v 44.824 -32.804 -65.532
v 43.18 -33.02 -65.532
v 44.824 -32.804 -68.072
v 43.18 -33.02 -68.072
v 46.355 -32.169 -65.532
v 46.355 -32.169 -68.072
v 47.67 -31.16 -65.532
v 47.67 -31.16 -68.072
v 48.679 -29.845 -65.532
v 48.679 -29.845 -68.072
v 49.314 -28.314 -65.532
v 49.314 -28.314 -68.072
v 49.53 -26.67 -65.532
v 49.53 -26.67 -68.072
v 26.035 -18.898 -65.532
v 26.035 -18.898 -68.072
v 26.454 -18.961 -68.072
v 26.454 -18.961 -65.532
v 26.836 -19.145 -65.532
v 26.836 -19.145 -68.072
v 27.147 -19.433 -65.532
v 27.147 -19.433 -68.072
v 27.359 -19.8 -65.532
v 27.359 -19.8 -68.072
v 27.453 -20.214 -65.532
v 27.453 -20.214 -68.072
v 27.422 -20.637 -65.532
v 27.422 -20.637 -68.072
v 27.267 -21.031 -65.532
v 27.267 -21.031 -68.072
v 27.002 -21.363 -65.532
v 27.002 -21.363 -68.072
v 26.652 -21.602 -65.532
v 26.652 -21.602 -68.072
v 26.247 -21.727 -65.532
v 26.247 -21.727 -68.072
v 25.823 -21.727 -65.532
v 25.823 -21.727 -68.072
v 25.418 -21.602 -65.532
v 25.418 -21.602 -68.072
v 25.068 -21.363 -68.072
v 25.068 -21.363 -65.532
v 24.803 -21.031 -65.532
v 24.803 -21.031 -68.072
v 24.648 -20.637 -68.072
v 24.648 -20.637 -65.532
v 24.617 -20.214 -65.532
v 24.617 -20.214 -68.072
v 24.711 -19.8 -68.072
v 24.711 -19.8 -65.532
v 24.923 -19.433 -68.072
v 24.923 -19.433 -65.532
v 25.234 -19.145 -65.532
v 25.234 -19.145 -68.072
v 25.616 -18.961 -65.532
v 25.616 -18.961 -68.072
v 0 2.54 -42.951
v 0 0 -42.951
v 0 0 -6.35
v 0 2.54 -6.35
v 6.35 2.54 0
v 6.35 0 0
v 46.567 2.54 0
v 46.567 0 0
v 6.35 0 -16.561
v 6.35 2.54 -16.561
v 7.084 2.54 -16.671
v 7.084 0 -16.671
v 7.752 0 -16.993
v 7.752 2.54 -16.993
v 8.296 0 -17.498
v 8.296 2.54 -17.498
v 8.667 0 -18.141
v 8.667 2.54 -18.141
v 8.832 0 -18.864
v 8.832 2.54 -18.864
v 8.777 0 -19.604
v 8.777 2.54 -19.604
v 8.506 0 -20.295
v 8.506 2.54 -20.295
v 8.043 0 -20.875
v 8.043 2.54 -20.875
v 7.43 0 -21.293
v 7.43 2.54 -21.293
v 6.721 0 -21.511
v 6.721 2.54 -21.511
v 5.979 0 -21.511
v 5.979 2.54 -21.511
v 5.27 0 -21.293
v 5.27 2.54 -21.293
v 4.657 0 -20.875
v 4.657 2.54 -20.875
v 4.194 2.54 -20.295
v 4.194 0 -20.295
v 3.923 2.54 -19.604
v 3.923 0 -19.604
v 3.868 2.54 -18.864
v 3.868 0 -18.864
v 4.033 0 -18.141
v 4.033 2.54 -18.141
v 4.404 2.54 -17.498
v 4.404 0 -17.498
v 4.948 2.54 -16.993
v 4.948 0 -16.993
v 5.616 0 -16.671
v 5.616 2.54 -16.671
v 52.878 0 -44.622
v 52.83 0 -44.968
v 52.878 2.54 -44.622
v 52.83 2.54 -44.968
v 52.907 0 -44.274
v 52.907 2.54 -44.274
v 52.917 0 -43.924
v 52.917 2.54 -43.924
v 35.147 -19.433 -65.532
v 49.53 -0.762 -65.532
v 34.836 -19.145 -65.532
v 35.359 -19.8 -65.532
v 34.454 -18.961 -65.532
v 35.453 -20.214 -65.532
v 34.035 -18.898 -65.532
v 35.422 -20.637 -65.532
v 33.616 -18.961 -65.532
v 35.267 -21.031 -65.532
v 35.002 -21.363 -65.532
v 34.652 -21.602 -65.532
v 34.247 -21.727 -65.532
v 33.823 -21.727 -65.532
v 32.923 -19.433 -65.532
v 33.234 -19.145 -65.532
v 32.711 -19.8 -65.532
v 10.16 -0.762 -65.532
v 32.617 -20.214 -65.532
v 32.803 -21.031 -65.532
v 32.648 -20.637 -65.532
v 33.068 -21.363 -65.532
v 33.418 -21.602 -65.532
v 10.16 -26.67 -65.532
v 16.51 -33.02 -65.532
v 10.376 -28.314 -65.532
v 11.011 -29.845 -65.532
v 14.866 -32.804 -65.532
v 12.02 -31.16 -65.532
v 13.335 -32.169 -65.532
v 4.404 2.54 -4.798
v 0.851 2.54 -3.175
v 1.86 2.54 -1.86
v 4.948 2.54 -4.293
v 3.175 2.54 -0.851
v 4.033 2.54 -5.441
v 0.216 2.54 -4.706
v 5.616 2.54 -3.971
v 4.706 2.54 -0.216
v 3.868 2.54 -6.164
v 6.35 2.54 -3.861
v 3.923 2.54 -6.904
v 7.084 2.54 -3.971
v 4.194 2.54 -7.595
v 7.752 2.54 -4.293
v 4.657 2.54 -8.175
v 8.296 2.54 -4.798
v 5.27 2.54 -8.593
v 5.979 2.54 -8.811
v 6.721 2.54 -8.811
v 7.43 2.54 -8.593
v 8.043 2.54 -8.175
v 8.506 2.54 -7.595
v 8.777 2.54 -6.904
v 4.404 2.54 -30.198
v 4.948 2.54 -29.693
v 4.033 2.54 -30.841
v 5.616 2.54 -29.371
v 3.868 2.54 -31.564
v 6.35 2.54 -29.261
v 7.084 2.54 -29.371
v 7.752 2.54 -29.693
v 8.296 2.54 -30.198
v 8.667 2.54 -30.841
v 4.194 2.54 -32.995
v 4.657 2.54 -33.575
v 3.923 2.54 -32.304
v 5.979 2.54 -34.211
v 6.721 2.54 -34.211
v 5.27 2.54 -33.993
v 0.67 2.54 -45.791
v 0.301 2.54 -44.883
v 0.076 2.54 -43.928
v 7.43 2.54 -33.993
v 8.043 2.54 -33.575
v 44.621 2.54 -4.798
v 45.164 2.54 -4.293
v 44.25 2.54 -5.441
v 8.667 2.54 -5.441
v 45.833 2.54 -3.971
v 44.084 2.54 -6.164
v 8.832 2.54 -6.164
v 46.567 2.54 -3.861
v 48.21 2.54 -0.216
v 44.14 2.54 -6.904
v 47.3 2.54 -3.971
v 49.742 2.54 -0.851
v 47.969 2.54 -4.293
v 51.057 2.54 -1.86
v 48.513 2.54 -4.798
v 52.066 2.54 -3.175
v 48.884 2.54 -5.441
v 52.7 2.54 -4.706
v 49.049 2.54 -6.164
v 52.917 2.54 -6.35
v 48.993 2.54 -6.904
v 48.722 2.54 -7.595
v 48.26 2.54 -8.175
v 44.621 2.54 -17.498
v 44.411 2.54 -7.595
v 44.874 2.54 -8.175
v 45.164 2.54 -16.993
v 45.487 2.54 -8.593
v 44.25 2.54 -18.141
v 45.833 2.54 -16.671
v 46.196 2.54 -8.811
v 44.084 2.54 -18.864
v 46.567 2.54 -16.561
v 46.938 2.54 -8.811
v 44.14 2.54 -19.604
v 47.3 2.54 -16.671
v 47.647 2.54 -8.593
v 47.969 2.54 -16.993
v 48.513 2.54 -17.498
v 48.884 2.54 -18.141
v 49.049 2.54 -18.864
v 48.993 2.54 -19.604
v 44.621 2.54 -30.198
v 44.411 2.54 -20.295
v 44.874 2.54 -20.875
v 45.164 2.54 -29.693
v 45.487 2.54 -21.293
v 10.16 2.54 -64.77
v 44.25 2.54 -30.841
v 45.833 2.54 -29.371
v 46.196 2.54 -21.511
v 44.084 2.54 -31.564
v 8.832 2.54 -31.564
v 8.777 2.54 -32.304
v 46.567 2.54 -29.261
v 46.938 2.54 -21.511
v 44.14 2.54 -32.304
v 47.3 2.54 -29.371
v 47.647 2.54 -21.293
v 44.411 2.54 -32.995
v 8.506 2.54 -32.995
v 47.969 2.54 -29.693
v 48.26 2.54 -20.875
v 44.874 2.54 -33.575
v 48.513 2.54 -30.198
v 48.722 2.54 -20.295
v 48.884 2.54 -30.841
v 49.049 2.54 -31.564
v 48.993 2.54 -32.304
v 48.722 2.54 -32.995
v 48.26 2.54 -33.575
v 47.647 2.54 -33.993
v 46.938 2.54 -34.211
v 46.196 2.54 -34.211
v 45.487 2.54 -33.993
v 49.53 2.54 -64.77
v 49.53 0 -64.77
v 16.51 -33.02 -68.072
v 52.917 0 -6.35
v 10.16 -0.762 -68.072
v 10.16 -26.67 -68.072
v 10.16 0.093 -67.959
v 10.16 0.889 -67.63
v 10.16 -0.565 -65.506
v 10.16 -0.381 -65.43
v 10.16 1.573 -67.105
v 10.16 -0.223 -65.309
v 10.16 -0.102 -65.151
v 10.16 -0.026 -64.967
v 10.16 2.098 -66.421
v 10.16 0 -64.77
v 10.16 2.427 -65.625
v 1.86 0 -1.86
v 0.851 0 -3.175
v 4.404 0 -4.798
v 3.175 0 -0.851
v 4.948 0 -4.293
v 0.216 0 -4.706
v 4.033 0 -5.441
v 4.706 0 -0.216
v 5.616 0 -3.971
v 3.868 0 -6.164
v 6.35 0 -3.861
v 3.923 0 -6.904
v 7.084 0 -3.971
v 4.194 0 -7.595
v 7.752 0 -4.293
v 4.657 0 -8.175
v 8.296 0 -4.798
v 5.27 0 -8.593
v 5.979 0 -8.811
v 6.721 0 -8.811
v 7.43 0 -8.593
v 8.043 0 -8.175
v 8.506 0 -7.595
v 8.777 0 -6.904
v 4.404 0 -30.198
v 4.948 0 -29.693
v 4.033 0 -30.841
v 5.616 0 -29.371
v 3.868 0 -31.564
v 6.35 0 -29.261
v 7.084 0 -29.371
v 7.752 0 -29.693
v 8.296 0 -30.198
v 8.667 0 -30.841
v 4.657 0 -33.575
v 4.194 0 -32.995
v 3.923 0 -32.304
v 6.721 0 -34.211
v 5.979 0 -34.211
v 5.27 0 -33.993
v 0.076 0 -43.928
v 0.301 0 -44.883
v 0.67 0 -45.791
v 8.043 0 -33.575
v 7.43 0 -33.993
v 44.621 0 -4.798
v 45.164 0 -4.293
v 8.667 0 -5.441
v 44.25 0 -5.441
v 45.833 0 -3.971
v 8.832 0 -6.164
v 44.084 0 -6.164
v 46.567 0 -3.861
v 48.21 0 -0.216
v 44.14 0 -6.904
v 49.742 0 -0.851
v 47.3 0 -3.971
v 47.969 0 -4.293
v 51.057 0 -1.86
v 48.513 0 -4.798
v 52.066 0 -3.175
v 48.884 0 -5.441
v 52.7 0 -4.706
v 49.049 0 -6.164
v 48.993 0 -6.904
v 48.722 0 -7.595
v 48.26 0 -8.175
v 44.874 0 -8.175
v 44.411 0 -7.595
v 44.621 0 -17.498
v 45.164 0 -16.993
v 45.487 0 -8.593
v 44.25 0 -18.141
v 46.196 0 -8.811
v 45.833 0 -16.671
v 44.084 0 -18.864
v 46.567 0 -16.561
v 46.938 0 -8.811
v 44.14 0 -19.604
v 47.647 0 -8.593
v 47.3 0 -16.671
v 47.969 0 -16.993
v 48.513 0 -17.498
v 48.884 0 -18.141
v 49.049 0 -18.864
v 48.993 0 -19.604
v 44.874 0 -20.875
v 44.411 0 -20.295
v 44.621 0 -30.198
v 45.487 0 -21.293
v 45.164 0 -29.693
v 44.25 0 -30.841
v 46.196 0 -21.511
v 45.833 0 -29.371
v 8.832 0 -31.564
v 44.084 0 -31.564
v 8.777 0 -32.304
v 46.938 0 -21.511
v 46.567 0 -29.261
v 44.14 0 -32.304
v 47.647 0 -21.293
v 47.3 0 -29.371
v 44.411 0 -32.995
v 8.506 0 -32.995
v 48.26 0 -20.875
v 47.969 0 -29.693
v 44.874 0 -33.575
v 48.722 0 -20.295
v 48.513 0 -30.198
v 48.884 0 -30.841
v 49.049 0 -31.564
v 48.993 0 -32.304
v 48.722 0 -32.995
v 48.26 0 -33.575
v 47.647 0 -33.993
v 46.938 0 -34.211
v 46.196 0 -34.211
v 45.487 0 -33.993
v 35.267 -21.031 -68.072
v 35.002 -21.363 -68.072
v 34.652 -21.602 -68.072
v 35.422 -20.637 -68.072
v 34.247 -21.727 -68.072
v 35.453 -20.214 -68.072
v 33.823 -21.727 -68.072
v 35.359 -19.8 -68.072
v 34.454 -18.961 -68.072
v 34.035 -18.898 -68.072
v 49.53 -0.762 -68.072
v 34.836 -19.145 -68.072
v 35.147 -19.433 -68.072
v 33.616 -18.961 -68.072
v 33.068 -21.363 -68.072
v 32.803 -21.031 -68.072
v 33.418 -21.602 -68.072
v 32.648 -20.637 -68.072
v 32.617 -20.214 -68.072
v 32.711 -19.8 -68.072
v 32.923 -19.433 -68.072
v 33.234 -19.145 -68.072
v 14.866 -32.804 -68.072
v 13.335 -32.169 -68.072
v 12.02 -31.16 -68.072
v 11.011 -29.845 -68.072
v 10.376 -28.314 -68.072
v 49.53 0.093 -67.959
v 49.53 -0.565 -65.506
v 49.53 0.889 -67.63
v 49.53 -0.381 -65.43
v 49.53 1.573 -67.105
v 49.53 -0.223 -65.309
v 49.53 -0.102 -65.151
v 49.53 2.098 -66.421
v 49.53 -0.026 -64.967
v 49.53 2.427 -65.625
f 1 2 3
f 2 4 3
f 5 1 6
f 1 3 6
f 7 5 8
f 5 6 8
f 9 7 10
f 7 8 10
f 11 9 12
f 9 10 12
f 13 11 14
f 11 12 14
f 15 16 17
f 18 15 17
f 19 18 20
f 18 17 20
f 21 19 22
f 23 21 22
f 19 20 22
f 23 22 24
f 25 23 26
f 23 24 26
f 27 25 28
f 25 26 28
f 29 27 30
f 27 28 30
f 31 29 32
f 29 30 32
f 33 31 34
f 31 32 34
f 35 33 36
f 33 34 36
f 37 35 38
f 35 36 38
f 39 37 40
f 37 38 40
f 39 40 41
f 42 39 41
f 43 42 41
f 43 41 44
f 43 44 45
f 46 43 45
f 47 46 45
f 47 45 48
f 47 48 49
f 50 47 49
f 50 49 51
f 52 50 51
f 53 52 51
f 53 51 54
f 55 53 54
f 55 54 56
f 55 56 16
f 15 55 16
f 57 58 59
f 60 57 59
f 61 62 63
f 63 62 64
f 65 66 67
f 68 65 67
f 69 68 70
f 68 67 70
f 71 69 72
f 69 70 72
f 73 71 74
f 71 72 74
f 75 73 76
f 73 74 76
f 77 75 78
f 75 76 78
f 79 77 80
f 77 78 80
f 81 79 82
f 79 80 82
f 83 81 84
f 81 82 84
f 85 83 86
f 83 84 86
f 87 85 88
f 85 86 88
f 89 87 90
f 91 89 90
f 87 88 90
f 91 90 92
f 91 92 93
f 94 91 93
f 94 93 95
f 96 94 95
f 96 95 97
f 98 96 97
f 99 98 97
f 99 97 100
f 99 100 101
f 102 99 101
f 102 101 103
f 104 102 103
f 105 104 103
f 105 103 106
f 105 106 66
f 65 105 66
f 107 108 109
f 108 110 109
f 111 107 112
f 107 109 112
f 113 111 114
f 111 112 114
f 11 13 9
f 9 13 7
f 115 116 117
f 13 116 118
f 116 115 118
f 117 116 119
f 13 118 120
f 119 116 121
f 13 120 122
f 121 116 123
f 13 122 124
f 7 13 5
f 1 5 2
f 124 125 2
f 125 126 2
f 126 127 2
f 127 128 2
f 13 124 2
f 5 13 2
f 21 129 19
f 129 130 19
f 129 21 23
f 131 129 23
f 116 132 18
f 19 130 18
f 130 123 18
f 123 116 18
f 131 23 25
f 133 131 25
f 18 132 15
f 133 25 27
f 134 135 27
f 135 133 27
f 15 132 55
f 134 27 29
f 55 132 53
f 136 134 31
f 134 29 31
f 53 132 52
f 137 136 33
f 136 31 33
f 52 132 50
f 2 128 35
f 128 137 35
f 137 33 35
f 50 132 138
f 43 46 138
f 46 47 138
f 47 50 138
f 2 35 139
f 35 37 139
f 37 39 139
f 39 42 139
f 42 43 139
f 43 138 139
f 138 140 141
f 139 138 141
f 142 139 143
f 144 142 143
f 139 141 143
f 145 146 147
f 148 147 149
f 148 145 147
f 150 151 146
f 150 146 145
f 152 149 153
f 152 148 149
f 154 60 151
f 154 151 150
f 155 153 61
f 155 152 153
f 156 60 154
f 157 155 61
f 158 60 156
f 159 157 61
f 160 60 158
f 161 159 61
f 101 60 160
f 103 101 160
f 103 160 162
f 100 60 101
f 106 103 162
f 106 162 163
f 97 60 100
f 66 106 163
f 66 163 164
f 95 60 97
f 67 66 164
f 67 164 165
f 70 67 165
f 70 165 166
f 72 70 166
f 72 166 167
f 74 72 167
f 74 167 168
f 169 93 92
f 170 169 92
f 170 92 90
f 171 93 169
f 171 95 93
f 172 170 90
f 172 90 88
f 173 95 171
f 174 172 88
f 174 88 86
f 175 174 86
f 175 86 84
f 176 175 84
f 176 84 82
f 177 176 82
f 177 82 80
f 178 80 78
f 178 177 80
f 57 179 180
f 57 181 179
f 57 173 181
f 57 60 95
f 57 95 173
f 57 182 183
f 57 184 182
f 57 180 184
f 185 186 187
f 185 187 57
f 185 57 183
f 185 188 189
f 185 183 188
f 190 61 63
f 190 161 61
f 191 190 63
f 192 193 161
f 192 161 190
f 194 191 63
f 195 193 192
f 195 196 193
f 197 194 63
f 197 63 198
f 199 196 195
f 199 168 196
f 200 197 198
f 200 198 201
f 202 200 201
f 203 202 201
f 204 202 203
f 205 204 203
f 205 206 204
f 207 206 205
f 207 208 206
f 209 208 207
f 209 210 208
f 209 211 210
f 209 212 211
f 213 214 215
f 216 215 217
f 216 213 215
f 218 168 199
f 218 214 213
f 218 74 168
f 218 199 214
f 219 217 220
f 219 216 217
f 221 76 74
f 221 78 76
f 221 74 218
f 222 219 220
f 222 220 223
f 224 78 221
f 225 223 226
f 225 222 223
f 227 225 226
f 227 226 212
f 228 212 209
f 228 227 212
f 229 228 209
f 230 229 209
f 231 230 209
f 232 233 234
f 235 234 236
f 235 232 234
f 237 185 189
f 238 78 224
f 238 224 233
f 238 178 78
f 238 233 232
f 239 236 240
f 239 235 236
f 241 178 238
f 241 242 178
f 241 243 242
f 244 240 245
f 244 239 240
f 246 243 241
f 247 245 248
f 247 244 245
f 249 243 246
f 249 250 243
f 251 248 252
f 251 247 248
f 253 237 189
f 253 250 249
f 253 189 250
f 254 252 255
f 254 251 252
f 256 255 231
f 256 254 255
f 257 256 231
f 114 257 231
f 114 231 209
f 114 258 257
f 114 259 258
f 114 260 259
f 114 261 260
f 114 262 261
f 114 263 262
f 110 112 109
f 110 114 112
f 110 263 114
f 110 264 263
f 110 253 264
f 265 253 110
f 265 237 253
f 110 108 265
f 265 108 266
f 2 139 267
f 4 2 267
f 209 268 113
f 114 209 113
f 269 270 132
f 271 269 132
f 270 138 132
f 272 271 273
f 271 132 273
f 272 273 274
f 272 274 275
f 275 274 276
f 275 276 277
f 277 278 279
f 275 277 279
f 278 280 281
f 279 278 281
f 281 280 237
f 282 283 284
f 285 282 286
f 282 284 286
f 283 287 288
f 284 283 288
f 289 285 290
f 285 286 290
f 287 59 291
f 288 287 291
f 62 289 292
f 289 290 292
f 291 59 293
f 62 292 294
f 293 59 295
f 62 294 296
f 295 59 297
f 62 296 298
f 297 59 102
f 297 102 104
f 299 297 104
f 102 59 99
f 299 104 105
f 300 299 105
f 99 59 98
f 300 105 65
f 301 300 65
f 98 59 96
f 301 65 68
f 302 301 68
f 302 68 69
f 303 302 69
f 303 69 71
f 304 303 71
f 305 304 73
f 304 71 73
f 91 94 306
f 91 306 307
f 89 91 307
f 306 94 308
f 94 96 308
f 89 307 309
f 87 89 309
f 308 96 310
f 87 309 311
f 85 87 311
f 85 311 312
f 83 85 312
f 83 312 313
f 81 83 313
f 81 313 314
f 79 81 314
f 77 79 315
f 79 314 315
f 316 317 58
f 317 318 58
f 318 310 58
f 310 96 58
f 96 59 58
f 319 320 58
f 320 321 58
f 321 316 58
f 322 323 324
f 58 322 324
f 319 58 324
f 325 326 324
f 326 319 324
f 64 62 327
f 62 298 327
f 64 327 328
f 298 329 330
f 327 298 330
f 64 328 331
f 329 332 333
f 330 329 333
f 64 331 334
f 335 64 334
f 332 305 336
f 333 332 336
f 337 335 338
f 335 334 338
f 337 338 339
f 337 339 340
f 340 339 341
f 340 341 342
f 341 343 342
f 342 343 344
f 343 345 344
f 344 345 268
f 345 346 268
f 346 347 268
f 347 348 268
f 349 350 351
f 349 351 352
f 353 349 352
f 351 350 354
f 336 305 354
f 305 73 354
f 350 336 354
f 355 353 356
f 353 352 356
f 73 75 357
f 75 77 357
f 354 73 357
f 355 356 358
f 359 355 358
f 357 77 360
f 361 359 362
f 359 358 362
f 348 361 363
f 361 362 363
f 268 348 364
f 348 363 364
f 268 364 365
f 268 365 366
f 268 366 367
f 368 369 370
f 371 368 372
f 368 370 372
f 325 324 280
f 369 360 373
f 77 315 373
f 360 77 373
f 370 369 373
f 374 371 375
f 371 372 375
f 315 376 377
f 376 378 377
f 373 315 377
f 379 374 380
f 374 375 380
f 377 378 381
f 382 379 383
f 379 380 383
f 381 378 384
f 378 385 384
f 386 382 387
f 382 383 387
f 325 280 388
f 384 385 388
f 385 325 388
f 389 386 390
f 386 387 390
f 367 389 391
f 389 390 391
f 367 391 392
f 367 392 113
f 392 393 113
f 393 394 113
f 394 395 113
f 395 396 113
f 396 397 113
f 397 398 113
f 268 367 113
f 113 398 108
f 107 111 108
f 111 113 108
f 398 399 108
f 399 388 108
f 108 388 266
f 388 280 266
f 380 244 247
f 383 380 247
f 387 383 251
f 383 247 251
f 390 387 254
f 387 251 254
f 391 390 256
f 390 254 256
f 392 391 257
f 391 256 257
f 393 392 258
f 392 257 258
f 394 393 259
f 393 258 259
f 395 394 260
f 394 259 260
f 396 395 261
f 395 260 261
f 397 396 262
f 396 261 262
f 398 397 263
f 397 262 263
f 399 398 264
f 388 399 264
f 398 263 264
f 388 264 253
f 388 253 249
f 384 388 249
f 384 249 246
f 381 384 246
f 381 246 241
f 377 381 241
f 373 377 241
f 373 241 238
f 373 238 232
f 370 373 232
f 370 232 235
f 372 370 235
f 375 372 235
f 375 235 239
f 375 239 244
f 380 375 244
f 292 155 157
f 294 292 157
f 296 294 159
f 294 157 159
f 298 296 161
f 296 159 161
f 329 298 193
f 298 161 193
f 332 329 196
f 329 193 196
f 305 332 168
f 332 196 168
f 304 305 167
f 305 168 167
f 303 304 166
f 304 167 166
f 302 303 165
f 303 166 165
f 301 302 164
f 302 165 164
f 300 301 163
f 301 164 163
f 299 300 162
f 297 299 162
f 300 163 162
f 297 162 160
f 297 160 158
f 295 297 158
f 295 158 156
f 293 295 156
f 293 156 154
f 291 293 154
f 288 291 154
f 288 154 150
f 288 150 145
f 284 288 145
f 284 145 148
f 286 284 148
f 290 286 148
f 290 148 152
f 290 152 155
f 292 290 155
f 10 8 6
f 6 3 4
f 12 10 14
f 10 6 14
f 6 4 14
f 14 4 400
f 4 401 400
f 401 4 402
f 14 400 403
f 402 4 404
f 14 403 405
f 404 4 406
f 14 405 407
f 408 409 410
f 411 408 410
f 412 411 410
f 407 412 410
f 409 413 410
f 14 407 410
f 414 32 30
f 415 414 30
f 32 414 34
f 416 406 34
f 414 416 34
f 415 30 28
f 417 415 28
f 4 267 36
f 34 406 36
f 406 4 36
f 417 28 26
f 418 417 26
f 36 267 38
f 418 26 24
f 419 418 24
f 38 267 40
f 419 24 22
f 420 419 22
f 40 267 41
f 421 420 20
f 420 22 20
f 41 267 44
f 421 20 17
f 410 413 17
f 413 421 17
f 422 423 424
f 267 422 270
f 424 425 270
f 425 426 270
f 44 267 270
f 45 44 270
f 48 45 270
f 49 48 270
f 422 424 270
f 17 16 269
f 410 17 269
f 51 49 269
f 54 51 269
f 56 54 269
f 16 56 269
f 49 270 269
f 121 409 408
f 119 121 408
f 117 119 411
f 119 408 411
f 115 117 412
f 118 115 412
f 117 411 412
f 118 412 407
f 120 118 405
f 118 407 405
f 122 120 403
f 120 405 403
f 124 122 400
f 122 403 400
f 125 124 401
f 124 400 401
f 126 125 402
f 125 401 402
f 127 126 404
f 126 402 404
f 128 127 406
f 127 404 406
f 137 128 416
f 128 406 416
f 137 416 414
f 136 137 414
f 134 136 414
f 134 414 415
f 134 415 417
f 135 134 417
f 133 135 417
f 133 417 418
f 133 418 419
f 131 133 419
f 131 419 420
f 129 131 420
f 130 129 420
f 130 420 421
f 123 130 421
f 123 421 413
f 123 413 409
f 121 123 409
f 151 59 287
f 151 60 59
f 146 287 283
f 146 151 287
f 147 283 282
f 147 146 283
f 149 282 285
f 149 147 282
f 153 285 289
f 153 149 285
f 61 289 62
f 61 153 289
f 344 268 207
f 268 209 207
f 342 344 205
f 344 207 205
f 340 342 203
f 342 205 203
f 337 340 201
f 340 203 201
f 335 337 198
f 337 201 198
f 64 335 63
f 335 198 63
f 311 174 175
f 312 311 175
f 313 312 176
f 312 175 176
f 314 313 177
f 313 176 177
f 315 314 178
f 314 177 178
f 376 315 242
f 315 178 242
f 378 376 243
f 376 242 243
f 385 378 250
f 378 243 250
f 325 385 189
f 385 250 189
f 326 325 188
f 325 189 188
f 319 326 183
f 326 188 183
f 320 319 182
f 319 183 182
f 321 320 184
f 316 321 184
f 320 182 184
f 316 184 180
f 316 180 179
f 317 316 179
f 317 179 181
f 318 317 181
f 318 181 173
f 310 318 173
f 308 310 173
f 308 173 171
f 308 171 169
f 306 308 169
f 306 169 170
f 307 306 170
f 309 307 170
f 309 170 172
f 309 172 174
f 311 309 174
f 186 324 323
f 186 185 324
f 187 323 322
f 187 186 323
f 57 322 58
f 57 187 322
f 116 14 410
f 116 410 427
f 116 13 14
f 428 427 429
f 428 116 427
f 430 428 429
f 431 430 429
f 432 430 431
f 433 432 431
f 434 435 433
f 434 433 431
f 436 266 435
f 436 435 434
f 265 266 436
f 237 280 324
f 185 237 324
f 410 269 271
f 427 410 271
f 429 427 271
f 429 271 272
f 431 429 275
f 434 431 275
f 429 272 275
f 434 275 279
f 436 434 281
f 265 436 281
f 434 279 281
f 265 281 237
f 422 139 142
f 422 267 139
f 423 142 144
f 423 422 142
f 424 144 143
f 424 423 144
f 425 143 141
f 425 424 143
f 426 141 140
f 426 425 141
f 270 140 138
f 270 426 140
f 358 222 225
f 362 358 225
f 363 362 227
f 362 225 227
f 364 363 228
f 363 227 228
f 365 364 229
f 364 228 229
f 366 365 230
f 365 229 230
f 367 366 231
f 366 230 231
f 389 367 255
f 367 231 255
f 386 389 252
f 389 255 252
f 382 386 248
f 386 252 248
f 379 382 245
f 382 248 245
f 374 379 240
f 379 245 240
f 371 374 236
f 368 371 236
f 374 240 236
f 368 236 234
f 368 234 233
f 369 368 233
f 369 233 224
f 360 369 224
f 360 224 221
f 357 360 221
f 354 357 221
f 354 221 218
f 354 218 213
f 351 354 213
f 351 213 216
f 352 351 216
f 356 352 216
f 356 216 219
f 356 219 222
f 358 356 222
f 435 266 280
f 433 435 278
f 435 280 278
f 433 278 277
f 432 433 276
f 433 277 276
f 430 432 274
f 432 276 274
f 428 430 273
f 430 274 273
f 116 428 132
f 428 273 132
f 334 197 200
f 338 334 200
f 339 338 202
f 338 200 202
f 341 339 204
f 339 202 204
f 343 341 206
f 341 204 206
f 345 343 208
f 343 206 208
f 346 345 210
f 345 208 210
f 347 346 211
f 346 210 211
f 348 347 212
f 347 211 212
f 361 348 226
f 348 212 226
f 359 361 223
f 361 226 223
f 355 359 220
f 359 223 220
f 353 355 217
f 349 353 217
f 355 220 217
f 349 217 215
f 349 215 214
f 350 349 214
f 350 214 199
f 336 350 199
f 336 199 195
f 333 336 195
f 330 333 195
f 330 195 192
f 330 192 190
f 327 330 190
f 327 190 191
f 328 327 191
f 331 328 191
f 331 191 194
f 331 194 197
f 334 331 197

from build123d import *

# Parameters (mm, degrees)
SKETCH1_R           = 2.4892
SKETCH1_R_2         = 1.4224
BOSS_EXTRUDE1_DEPTH = 3.175
BASE_FLANGE1_DEPTH  = 2.54
EDGE_FLANGE1_START  = 10.16
EDGE_FLANGE1_DEPTH  = 39.37
SKETCH10_R          = 2.4892
CUT_EXTRUDE1_DEPTH  = 115.617842028
SKETCH11_R          = 1.4224
CUT_EXTRUDE2_DEPTH  = 93.32708809
FILLET1_R           = 6.35


# Read off the part's stored shape, not the designer's step: Edge-Flange1
# Sheet-metal steps are written as plain solids
with BuildPart() as part:
    # Sketch1 → Boss-Extrude1 (new body)
    with BuildSketch(Plane(origin=(0, 0, 0), x_dir=(1, 0, 0), z_dir=(0, 1, 0))):
        Polygon((0, 0), (52.916666667, 0), (52.916666667, 44.45), (44.45, 95.25), (25.4, 95.25), (0, 44.45), align=None)
        with Locations(Location((6.35, 6.35, 0), (0, 0, 270))):
            Circle(SKETCH1_R, mode=Mode.SUBTRACT)
        with Locations(Location((6.35, 19.05, 0), (0, 0, 270))):
            Circle(SKETCH1_R, mode=Mode.SUBTRACT)
        with Locations(Location((6.35, 31.75, 0), (0, 0, 270))):
            Circle(SKETCH1_R, mode=Mode.SUBTRACT)
        with Locations(Location((46.566666667, 6.35, 0), (0, 0, 270))):
            Circle(SKETCH1_R, mode=Mode.SUBTRACT)
        with Locations(Location((46.566666667, 19.05, 0), (0, 0, 270))):
            Circle(SKETCH1_R, mode=Mode.SUBTRACT)
        with Locations(Location((46.566666667, 31.75, 0), (0, 0, 270))):
            Circle(SKETCH1_R, mode=Mode.SUBTRACT)
        with Locations(Location((31.75508, 82.56016, 0), (0, 0, 270))):
            Circle(SKETCH1_R_2, mode=Mode.SUBTRACT)
        with Locations(Location((39.755080002, 82.56016, 0), (0, 0, 270))):
            Circle(SKETCH1_R_2, mode=Mode.SUBTRACT)
    extrude(amount=BOSS_EXTRUDE1_DEPTH)


with BuildPart() as body_2:
    # Sketch2 → Base-Flange1 (new body)
    with BuildSketch(Plane(origin=(0, 0, 0), x_dir=(1, 0, 0), z_dir=(0, 1, 0))):
        Polygon((0, 0), (52.916666667, 0), (52.916666667, 44.45), (49.53, 64.77), (10.16, 64.77), (0, 44.45), align=None)
    extrude(amount=BASE_FLANGE1_DEPTH)

    # Edge-Flange1 outline → Edge-Flange1 (add)
    with BuildSketch(Plane.YZ.offset(EDGE_FLANGE1_START)):
        with BuildLine():
            Line((-33.02, -68.072), (-0.762, -68.072))
            ThreePointArc((-0.762, -68.072), (1.572866591, -67.104866591), (2.54, -64.77))
            Line((2.54, -64.77), (0, -64.77))
            ThreePointArc((0, -64.77), (-0.223184633, -65.308815367), (-0.762, -65.532))
            Line((-0.762, -65.532), (-33.02, -65.532))
            Line((-33.02, -65.532), (-33.02, -68.072))
        make_face()
    extrude(amount=EDGE_FLANGE1_DEPTH)

    # Sketch10 → Cut-Extrude1 (cut, through all)
    with BuildSketch(Plane(origin=(0, 2.54, 0), x_dir=(1, 0, 0), z_dir=(0, 1, 0))):
        with Locations(Location((46.566666667, 31.75, 0), (0, 0, 270))):
            Circle(SKETCH10_R)
        with Locations(Location((46.566666667, 19.05, 0), (0, 0, 270))):
            Circle(SKETCH10_R)
        with Locations(Location((46.566666667, 6.35, 0), (0, 0, 270))):
            Circle(SKETCH10_R)
        with Locations(Location((6.35, 6.35, 0), (0, 0, 270))):
            Circle(SKETCH10_R)
        with Locations(Location((6.35, 19.05, 0), (0, 0, 270))):
            Circle(SKETCH10_R)
        with Locations(Location((6.35, 31.75, 0), (0, 0, 270))):
            Circle(SKETCH10_R)
    extrude(amount=-CUT_EXTRUDE1_DEPTH, mode=Mode.SUBTRACT)

    # Sketch11 → Cut-Extrude2 (cut, through all)
    with BuildSketch(Plane(origin=(0, 0, -68.072), x_dir=(-1, 0, 0), z_dir=(0, 0, -1))):
        with Locations(Location((-34.035000002, -20.32, 0), (0, 0, 90))):
            Circle(SKETCH11_R)
        with Locations(Location((-26.035, -20.32, 0), (0, 0, 90))):
            Circle(SKETCH11_R)
    extrude(amount=-CUT_EXTRUDE2_DEPTH, mode=Mode.SUBTRACT)

    # Fillet1
    fillet1_edges = [body_2.edges().sort_by_distance(p)[0] for p in [
        (0, 1.27, -44.45),
        (52.916666667, 1.27, -44.45),
        (52.916666667, 1.27, 0),
        (0, 1.27, 0),
        (10.16, -33.02, -66.802),
        (49.53, -33.02, -66.802),
    ]]
    fillet(fillet1_edges, radius=FILLET1_R)


solid = body_2.part
